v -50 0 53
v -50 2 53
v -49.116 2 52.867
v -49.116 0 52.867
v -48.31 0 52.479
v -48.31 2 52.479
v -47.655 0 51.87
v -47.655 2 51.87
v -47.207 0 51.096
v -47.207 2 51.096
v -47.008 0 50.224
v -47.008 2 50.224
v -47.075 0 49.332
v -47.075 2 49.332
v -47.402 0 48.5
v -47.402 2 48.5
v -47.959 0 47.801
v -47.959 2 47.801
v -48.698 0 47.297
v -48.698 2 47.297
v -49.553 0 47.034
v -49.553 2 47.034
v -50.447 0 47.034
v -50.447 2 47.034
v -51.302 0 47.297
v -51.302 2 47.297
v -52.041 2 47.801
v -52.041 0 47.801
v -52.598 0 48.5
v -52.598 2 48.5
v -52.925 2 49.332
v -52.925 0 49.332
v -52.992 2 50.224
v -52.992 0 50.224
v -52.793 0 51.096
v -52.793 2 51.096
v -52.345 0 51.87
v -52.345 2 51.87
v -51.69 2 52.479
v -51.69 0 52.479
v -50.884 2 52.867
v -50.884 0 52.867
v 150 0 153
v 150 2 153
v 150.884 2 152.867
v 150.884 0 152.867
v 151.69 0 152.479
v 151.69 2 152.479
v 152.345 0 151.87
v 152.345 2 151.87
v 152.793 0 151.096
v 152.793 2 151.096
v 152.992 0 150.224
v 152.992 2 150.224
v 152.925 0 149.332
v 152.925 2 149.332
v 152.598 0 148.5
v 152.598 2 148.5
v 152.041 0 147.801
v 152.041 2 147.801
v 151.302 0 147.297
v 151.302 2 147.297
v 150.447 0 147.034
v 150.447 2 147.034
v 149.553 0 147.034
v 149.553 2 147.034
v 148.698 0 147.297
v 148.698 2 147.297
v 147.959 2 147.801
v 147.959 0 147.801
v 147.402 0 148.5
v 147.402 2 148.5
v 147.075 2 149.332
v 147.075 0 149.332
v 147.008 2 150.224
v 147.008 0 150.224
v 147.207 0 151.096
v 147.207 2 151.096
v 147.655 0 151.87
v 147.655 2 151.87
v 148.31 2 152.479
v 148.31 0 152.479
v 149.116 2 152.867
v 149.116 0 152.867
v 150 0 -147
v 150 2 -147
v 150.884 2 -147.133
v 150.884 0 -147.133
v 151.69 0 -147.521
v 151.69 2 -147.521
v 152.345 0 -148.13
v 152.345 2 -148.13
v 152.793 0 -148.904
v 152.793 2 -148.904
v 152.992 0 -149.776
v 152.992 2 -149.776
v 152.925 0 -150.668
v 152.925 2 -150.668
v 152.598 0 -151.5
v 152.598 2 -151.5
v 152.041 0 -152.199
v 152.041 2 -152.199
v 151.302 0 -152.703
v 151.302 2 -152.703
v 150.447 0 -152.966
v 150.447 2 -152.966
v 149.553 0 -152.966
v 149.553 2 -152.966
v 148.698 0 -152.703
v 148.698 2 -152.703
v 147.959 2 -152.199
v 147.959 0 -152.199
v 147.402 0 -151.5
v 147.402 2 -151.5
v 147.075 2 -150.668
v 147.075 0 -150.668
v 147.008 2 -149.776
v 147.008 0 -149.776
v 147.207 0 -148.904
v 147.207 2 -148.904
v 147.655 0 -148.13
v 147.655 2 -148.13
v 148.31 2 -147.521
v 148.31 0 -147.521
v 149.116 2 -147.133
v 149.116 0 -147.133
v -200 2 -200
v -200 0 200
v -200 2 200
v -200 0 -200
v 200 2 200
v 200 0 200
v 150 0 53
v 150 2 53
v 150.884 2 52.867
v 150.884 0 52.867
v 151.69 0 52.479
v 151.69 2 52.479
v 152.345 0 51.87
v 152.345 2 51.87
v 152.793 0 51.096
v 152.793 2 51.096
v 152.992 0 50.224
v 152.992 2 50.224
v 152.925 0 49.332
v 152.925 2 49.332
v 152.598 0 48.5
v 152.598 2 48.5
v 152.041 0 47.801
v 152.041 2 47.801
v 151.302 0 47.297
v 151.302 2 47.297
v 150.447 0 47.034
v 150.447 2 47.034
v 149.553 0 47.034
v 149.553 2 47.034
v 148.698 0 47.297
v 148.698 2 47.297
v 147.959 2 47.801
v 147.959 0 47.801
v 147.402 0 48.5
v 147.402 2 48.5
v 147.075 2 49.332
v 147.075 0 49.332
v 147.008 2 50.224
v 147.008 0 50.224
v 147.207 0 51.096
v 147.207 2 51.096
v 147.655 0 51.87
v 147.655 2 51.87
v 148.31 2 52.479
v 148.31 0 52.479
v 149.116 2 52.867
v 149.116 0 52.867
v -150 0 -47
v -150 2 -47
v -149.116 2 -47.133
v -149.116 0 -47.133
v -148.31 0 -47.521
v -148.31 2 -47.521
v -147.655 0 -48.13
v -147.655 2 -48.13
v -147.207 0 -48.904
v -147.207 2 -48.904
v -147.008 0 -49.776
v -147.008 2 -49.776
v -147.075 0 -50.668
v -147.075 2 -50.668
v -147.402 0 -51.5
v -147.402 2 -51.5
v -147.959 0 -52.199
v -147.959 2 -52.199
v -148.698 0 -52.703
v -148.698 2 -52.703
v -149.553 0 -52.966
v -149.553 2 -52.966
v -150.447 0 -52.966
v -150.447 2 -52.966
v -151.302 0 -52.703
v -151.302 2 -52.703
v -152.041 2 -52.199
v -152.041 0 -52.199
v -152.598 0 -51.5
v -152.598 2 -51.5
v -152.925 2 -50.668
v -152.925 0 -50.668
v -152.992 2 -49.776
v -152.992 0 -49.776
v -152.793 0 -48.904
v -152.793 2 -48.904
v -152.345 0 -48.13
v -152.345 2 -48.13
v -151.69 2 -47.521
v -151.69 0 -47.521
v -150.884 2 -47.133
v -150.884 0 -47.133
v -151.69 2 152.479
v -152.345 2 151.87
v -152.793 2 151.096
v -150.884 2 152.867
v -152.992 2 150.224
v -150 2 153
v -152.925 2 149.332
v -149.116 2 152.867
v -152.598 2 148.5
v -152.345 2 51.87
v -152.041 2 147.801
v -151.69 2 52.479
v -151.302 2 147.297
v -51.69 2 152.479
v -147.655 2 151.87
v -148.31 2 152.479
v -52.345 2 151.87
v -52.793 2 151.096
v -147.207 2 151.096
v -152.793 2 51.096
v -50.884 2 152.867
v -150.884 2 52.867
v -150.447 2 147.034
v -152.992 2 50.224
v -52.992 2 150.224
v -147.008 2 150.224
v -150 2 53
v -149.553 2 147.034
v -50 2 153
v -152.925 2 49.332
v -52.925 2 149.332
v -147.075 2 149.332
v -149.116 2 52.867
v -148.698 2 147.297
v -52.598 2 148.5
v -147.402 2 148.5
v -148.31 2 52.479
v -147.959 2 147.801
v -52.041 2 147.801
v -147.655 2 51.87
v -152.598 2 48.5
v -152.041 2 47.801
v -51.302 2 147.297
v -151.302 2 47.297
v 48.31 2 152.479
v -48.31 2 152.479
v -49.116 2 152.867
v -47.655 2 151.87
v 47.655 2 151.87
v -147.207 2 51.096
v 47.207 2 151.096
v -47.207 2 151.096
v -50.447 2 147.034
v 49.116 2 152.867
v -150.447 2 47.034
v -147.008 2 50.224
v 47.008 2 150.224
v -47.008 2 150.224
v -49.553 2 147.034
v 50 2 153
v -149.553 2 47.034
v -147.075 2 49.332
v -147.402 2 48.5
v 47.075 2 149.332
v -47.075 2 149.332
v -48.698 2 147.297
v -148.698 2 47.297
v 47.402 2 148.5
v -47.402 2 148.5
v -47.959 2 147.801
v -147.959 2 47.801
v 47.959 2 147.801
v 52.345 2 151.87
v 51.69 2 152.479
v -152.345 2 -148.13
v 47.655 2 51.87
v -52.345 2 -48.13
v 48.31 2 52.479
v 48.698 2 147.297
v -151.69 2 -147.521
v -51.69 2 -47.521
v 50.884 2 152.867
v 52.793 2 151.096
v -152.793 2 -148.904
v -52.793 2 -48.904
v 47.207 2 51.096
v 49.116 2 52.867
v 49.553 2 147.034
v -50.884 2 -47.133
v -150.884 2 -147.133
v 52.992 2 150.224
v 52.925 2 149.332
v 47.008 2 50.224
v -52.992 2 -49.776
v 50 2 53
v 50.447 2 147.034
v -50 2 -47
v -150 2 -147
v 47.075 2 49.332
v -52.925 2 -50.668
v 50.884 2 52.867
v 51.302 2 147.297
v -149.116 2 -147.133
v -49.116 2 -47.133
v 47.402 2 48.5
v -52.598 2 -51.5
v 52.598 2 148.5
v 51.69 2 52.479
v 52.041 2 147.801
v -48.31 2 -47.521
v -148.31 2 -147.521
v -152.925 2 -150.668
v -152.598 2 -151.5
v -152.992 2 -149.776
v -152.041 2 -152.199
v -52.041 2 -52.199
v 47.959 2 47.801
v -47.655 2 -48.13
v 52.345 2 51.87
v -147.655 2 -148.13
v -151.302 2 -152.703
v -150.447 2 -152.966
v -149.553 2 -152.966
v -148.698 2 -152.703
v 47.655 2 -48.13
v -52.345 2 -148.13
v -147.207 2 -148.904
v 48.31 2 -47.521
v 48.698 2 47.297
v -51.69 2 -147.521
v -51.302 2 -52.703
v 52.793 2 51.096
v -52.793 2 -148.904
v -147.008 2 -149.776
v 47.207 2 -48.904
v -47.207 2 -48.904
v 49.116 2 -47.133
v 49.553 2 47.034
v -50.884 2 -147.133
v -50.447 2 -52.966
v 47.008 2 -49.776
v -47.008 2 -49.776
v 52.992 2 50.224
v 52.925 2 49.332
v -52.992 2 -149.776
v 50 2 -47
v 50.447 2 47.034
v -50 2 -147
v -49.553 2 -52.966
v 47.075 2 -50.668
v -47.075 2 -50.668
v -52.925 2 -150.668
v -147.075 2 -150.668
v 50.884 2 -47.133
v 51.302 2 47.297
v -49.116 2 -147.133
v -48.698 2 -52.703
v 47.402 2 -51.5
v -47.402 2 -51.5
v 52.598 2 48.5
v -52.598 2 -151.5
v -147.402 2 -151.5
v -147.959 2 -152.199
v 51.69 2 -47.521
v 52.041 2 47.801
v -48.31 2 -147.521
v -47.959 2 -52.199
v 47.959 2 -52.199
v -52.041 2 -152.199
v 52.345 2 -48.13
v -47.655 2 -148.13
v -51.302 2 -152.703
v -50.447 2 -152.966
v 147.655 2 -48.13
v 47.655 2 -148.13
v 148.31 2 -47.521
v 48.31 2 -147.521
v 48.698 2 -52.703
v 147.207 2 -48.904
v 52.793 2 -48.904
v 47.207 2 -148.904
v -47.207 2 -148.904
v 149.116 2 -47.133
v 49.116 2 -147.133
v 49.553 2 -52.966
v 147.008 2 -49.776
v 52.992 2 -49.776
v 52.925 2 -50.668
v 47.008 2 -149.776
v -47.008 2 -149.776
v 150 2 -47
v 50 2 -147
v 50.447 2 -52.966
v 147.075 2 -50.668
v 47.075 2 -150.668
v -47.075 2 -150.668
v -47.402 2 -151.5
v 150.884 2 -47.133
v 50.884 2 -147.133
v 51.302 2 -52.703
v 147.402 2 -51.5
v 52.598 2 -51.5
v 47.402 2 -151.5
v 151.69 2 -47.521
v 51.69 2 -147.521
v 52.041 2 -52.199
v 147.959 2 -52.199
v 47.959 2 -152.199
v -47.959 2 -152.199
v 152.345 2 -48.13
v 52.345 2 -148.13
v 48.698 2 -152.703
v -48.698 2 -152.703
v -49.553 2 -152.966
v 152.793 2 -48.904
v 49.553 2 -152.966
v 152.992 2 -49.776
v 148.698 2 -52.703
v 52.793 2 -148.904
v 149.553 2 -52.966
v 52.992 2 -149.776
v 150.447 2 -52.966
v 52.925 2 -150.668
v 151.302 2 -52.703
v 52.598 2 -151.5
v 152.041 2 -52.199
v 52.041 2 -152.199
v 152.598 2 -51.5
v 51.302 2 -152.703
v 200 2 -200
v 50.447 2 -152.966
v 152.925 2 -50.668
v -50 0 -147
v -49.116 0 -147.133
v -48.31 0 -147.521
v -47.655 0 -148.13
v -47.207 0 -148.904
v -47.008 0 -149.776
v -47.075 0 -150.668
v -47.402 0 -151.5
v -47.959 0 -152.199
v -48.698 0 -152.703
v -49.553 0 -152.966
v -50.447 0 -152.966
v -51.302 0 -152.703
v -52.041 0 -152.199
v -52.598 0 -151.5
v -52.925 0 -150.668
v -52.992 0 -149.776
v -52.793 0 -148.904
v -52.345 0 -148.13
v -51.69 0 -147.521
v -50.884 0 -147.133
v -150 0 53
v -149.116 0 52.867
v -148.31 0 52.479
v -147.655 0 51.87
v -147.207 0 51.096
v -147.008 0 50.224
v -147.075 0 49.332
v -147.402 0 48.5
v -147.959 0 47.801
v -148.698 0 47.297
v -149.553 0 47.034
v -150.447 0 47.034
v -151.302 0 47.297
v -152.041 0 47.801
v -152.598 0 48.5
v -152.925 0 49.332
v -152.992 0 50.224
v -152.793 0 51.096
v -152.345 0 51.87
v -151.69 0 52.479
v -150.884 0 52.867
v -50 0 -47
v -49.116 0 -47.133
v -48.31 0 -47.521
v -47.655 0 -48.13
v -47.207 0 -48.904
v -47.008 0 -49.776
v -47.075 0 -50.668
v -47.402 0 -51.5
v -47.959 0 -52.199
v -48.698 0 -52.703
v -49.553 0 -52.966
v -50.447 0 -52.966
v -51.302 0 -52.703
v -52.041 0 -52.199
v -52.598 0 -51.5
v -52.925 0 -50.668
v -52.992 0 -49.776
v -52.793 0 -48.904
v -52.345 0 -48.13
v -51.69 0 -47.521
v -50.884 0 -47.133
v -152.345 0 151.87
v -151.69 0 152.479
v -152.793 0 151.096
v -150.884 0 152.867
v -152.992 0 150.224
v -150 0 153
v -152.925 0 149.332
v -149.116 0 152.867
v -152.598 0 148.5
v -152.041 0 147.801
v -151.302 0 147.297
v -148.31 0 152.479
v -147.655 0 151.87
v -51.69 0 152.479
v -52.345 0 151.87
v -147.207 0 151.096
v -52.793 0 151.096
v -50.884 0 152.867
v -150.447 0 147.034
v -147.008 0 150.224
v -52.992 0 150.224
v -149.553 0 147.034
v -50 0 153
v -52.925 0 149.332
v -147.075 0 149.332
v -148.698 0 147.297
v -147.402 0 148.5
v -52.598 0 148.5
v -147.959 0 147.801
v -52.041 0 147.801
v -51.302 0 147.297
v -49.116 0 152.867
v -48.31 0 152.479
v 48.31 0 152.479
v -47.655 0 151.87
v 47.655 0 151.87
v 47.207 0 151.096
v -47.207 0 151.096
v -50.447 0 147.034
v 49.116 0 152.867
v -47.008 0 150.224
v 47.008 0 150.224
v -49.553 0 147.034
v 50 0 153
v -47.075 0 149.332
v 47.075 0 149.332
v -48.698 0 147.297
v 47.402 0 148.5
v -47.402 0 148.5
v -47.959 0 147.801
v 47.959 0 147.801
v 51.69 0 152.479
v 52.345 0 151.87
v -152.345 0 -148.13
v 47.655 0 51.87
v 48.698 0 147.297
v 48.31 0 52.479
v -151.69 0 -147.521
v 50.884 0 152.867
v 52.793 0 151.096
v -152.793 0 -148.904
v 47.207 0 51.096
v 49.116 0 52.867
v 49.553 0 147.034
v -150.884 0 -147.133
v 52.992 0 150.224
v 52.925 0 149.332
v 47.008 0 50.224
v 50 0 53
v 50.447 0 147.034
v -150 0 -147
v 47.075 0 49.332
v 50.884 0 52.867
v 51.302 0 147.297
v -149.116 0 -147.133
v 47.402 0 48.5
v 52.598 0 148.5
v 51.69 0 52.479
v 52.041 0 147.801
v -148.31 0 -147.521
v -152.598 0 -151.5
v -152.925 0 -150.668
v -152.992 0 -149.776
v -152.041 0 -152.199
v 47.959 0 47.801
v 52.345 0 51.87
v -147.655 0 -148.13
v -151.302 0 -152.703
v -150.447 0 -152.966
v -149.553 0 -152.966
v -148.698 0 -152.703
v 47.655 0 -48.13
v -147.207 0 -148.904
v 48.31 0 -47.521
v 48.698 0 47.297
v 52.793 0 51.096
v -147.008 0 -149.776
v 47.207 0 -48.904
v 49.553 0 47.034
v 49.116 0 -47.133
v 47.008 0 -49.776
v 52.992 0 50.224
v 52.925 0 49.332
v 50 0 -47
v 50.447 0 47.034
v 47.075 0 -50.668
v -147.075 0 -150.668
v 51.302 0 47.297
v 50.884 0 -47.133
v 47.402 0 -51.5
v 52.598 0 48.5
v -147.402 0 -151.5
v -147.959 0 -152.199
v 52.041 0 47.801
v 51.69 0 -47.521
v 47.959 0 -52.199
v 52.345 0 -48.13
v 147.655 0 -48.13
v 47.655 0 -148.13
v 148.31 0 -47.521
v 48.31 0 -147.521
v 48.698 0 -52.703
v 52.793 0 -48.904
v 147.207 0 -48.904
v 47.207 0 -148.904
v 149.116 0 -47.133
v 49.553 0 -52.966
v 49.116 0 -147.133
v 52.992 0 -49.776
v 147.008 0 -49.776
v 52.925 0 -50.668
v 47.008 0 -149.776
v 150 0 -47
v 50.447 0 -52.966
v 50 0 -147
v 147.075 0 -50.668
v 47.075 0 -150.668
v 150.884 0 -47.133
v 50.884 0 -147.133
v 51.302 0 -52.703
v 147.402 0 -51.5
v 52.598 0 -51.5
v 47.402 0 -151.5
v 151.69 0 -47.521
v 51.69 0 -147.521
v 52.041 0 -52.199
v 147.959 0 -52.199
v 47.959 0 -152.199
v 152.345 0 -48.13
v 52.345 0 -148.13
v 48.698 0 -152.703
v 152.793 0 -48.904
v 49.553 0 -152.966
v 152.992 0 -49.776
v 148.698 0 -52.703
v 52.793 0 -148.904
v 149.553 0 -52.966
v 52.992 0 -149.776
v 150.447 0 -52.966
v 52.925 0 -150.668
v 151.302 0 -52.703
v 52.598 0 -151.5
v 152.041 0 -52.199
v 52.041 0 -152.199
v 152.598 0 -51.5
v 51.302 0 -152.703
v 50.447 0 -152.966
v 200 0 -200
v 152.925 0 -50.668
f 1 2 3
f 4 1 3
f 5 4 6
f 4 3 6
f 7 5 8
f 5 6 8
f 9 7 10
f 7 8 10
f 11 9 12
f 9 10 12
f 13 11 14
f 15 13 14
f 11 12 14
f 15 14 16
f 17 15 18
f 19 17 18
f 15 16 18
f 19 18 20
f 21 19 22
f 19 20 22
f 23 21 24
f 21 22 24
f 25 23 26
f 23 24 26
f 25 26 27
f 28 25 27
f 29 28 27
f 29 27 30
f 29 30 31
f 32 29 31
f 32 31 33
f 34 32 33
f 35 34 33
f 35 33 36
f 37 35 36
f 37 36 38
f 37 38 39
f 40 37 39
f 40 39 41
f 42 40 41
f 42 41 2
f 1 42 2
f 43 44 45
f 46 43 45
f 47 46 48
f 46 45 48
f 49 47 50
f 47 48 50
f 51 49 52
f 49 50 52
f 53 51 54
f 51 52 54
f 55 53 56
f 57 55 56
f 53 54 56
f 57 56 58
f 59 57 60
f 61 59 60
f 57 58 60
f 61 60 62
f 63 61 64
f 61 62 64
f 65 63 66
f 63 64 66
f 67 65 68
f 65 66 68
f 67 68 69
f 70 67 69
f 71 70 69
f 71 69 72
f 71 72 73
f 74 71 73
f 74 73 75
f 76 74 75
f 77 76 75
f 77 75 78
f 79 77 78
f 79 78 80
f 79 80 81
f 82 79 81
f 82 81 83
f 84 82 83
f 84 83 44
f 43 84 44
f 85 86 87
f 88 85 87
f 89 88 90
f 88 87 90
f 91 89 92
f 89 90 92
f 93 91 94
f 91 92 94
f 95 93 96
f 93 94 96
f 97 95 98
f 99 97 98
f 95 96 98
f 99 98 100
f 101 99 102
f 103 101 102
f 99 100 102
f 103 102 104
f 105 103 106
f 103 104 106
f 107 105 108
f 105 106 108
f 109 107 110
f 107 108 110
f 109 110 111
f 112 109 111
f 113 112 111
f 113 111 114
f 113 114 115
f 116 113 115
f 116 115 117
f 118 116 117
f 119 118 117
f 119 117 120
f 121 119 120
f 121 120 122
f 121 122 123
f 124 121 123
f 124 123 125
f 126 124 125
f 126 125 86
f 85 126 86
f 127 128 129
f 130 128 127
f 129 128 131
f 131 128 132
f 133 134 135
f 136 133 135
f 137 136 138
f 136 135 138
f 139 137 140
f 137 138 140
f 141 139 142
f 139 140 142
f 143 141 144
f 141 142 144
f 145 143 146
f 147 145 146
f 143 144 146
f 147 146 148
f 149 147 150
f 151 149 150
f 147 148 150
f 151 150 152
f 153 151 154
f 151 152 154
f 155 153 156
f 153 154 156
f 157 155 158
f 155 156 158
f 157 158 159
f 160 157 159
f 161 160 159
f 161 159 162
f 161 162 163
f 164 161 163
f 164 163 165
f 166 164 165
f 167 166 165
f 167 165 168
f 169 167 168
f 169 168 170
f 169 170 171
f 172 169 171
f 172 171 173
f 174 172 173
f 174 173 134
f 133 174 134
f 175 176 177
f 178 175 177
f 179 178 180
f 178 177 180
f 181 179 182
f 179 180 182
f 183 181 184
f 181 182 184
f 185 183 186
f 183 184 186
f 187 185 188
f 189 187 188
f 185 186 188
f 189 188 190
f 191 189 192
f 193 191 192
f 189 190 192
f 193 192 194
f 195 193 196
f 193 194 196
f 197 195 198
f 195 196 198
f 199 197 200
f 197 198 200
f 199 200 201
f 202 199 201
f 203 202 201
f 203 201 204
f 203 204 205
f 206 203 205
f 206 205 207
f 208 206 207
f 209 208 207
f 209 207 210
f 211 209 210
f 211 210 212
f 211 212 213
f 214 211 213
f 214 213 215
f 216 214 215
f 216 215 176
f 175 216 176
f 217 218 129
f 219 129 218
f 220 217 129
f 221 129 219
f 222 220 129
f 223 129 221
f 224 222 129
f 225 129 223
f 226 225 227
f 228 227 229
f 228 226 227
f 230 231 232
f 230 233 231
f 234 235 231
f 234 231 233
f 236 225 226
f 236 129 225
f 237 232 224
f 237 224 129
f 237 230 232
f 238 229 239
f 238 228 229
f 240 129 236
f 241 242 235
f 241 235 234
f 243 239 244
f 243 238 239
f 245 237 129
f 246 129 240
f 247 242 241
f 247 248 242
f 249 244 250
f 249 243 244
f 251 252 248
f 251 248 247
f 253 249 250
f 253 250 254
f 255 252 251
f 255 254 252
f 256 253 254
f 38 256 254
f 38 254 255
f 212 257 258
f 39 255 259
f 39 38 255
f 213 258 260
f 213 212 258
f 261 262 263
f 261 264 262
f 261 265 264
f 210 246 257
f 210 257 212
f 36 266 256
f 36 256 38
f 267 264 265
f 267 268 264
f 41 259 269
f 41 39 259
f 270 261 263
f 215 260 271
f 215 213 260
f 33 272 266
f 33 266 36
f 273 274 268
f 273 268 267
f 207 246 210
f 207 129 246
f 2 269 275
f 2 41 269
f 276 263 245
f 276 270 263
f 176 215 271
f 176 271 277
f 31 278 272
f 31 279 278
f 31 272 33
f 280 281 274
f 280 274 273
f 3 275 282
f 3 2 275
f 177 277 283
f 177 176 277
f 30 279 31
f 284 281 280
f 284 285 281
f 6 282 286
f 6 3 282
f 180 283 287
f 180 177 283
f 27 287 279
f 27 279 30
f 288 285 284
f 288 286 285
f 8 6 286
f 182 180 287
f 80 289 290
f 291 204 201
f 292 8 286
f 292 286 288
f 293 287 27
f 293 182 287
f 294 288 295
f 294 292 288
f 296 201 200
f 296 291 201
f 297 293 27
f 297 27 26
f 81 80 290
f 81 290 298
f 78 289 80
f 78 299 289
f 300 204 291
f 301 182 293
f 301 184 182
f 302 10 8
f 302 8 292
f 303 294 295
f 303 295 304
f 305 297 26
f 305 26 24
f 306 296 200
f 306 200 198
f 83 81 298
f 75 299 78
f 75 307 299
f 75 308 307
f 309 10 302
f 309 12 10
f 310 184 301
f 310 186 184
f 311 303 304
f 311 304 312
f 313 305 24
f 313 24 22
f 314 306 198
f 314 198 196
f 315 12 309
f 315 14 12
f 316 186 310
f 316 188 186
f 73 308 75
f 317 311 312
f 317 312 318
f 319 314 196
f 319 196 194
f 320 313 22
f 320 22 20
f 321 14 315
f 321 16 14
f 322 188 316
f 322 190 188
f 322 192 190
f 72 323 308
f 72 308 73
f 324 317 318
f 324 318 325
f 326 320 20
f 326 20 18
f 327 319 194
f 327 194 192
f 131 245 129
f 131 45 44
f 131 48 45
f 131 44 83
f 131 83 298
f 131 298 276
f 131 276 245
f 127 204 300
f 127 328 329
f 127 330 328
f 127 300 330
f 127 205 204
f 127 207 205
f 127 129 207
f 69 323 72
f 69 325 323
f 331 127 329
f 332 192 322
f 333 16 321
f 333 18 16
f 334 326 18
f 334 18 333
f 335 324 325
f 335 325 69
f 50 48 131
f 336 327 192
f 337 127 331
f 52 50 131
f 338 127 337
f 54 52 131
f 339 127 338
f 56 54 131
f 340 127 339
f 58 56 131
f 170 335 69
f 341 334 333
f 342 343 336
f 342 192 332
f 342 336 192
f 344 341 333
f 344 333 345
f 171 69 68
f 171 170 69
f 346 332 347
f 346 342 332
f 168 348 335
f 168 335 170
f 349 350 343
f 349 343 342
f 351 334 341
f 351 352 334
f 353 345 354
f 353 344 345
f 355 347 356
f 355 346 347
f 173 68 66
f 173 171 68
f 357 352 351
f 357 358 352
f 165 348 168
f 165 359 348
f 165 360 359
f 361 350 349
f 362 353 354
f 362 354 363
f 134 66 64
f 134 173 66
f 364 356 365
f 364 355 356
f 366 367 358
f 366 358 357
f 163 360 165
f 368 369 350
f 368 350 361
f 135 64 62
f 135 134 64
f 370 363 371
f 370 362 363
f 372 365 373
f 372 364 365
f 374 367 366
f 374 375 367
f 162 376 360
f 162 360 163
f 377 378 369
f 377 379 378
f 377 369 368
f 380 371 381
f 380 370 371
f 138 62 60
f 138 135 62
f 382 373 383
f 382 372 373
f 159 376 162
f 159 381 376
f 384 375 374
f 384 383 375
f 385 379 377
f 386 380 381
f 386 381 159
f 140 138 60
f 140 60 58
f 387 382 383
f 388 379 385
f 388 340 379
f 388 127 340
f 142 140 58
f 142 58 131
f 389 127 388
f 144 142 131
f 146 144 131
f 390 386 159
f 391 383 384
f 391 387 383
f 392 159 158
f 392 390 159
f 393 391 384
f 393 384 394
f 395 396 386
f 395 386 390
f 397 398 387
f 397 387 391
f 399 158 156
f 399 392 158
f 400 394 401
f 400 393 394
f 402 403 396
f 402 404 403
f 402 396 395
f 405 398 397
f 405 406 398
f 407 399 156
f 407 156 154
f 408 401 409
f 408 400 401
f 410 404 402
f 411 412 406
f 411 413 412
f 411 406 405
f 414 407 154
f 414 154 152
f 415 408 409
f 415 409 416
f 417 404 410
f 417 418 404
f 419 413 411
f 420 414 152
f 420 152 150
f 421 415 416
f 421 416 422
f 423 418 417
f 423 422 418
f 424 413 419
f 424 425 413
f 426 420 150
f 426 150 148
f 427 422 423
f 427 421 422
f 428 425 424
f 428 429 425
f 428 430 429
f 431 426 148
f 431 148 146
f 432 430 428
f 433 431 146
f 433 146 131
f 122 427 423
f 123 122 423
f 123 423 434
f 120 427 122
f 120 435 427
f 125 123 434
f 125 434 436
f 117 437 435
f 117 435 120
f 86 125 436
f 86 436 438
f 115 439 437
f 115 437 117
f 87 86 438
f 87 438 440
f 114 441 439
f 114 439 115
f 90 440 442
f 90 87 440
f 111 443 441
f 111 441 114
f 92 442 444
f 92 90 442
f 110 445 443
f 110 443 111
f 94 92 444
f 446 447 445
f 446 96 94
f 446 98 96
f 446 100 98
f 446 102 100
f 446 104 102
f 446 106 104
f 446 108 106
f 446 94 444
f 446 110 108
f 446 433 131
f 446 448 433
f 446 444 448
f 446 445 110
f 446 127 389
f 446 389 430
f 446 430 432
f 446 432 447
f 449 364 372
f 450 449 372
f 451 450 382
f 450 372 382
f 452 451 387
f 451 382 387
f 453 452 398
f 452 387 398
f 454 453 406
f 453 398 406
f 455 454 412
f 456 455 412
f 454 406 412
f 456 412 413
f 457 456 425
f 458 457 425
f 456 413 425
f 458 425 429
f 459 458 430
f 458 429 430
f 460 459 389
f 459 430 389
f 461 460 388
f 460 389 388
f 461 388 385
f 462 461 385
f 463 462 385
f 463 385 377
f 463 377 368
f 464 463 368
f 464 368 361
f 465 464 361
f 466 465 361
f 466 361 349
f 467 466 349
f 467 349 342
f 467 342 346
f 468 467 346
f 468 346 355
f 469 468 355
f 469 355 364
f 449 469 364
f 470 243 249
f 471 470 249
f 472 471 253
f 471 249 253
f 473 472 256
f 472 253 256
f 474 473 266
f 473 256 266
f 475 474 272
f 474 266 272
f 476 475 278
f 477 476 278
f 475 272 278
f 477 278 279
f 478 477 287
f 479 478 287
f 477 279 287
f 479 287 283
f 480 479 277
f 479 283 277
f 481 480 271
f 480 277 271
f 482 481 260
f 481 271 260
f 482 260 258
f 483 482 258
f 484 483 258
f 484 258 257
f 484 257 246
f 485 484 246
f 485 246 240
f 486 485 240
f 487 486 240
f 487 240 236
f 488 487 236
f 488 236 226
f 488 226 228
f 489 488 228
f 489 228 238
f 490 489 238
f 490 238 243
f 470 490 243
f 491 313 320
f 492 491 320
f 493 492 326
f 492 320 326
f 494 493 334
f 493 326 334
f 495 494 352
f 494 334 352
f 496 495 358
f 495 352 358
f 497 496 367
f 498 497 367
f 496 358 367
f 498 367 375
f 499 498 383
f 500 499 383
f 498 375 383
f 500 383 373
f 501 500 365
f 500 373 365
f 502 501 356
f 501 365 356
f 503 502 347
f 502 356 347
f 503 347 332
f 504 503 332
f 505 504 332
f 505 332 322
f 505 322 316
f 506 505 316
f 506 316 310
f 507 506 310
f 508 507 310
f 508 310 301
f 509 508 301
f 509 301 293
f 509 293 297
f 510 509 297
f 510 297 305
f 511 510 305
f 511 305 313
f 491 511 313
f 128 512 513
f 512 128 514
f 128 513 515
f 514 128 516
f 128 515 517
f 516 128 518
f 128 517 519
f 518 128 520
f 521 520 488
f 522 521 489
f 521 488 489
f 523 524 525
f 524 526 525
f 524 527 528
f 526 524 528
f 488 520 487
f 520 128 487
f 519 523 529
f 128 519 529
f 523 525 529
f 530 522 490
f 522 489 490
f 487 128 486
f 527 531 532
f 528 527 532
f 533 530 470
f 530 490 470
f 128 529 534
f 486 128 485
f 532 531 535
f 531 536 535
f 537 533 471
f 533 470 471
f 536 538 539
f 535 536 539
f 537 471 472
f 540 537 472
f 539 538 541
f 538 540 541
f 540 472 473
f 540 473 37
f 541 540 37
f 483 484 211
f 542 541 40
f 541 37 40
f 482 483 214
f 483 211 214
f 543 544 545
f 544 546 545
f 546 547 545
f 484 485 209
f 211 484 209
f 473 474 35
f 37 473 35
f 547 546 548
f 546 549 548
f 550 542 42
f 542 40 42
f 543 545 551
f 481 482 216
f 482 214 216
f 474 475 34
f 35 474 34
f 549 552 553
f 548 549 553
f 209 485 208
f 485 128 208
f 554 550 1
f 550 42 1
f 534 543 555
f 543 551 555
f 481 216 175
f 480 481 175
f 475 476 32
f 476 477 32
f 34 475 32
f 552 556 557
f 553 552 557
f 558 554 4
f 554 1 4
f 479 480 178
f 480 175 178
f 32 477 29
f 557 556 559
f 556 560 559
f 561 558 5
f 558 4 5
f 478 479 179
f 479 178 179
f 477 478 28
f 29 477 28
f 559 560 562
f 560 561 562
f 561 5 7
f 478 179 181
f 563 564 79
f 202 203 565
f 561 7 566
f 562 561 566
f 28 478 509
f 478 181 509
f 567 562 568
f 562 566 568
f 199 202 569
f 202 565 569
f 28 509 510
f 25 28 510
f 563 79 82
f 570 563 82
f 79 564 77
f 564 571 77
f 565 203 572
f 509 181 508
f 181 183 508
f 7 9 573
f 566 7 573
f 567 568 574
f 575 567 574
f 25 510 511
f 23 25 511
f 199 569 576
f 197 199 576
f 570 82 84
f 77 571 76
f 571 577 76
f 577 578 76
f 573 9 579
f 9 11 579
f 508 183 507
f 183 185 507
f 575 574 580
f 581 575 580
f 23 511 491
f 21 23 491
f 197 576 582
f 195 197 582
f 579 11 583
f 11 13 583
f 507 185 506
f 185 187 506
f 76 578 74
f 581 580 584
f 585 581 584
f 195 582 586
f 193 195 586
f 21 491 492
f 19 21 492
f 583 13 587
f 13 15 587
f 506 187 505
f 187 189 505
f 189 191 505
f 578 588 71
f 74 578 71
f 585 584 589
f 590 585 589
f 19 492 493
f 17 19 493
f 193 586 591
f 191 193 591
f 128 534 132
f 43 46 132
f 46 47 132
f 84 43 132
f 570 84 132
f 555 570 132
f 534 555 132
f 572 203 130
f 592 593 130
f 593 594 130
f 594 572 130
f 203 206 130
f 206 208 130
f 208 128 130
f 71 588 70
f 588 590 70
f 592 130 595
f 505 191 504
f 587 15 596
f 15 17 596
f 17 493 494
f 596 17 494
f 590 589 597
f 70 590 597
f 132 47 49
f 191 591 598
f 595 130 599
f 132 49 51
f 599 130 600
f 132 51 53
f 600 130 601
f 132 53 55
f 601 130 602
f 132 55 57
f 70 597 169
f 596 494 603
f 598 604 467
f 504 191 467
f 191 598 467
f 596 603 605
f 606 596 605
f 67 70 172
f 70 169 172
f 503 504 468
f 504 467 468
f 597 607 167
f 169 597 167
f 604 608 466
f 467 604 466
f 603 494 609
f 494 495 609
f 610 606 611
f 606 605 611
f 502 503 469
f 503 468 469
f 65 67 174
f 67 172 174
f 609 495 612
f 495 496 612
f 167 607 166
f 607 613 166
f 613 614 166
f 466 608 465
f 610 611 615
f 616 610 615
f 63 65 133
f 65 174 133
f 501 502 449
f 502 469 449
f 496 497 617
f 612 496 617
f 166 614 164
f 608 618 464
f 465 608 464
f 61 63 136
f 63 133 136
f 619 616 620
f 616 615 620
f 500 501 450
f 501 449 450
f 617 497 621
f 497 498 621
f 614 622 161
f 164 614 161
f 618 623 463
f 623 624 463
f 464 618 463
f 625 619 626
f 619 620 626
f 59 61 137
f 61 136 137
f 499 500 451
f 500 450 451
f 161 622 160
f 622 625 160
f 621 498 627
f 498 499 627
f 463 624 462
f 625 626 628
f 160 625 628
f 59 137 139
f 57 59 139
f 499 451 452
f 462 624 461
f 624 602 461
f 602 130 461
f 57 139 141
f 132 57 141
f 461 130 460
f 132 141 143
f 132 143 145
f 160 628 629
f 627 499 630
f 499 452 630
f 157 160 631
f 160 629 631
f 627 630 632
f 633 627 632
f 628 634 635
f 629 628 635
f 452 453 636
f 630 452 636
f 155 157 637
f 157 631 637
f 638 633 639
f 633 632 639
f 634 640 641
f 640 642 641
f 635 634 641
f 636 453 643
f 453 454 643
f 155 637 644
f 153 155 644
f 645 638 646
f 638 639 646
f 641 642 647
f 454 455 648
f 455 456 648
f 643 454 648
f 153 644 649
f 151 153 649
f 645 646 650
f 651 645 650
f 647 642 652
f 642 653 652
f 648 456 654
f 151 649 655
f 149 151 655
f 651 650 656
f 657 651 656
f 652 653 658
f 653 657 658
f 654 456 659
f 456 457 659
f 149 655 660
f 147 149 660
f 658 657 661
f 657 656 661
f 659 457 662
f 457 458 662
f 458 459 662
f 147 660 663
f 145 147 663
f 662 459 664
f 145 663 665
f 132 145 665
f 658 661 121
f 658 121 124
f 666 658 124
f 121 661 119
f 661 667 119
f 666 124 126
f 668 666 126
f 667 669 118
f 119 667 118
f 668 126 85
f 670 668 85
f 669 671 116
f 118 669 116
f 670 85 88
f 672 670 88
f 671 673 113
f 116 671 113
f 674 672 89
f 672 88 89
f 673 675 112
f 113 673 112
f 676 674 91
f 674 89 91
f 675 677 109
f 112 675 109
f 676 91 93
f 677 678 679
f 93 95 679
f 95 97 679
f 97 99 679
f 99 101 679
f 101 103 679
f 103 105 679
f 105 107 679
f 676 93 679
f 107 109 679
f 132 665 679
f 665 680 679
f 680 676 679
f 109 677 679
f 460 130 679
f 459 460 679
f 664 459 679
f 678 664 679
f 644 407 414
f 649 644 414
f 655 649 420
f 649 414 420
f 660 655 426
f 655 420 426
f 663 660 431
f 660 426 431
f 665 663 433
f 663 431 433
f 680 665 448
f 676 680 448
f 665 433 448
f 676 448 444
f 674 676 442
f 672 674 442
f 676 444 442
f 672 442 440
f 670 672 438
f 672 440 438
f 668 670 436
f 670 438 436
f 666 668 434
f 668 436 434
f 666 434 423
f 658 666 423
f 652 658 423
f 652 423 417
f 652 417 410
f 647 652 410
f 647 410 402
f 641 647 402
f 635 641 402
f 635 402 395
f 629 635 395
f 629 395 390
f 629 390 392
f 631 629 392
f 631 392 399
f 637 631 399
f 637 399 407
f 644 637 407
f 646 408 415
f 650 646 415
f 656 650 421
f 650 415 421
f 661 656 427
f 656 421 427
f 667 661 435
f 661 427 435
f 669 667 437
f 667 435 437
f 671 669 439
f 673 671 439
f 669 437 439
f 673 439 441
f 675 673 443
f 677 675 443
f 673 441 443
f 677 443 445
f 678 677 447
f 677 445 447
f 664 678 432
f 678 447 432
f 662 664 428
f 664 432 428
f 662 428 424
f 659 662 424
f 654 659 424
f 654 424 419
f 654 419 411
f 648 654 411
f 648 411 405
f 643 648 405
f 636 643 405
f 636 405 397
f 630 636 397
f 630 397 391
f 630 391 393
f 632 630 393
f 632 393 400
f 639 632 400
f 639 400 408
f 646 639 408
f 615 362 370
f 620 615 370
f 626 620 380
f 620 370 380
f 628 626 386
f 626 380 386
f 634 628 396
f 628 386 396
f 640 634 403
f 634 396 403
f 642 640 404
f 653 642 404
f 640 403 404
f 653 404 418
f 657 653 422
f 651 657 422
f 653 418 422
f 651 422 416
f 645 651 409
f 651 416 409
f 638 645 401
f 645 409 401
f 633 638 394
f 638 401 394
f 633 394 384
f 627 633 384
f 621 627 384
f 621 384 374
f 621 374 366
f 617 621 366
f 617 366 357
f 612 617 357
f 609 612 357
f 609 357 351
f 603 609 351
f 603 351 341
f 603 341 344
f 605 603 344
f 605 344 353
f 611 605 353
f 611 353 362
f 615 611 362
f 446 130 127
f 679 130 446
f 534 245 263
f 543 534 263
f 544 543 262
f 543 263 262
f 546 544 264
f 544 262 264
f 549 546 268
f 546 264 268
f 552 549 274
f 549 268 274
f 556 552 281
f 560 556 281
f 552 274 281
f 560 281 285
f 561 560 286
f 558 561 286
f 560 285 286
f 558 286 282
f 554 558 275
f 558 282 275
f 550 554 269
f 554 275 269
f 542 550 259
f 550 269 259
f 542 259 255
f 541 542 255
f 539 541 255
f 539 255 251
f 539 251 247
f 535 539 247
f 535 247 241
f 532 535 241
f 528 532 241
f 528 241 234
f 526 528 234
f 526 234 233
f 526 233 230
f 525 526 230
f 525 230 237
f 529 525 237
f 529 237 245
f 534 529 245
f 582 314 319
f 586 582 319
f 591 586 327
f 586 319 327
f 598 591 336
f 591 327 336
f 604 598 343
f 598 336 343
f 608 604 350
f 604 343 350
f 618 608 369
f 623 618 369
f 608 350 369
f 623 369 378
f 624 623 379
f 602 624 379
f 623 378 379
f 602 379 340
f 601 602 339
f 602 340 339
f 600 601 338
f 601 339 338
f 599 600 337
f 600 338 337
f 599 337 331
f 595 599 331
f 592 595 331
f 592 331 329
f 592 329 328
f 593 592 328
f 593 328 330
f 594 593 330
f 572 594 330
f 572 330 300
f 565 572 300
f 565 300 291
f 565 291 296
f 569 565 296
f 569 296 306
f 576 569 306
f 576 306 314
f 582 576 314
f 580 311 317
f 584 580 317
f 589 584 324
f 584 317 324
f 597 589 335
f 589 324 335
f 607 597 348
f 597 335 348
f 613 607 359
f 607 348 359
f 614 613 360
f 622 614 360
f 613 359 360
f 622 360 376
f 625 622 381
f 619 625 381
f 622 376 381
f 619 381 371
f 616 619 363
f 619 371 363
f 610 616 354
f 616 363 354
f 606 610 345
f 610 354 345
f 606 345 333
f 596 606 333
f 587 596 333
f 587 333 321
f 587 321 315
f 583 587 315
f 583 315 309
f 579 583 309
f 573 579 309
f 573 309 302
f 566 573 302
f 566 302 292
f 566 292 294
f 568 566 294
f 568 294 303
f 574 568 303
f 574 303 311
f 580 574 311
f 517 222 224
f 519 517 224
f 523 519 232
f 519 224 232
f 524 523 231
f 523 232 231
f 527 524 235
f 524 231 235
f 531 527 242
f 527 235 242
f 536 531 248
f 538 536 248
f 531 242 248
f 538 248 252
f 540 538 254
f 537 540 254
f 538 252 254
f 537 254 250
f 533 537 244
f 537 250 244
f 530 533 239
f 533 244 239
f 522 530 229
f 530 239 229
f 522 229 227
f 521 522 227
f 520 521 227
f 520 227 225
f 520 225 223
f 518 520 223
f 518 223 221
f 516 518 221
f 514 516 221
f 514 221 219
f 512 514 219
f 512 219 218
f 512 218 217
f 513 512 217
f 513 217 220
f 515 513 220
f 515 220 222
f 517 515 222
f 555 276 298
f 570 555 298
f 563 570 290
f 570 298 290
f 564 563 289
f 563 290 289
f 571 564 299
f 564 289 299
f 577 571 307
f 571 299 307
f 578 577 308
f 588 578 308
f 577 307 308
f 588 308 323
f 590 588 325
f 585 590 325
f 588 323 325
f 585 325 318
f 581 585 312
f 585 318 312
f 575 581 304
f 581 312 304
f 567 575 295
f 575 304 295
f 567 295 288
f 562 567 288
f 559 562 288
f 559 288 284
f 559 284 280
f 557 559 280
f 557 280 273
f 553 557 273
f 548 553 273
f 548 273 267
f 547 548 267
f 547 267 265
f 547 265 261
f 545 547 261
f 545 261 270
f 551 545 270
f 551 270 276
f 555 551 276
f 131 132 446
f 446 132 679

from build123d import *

# Parameters (mm, degrees)
SKETCH1_W           = 400
SKETCH1_H           = 400
BOSS_EXTRUDE1_DEPTH = 2
SKETCH2_R           = 3
CUT_EXTRUDE1_DEPTH  = 283.849783454


with BuildPart() as part:
    # Sketch1 → Boss-Extrude1 (new body)
    with BuildSketch(Plane(origin=(0, 0, 0), x_dir=(1, 0, 0), z_dir=(0, 1, 0))):
        Rectangle(SKETCH1_W, SKETCH1_H)
    extrude(amount=BOSS_EXTRUDE1_DEPTH)

    # Sketch2 → Cut-Extrude1 (cut, through all)
    with BuildSketch(Plane(origin=(0, 2, 0), x_dir=(1, 0, 0), z_dir=(0, 1, 0))):
        with Locations(Location((-150, 150, 0), (0, 0, 270))):
            Circle(SKETCH2_R)
        with Locations(Location((-50, 150, 0), (0, 0, 270))):
            Circle(SKETCH2_R)
        with Locations(Location((50, 150, 0), (0, 0, 270))):
            Circle(SKETCH2_R)
        with Locations(Location((150, 150, 0), (0, 0, 270))):
            Circle(SKETCH2_R)
        with Locations(Location((-50, 50, 0), (0, 0, 270))):
            Circle(SKETCH2_R)
        with Locations(Location((50, 50, 0), (0, 0, 270))):
            Circle(SKETCH2_R)
        with Locations(Location((150, 50, 0), (0, 0, 270))):
            Circle(SKETCH2_R)
        with Locations(Location((-50, -50, 0), (0, 0, 270))):
            Circle(SKETCH2_R)
        with Locations(Location((50, -50, 0), (0, 0, 270))):
            Circle(SKETCH2_R)
        with Locations(Location((150, -50, 0), (0, 0, 270))):
            Circle(SKETCH2_R)
        with Locations(Location((-50, -150, 0), (0, 0, 270))):
            Circle(SKETCH2_R)
        with Locations(Location((50, -150, 0), (0, 0, 270))):
            Circle(SKETCH2_R)
        with Locations(Location((150, -150, 0), (0, 0, 270))):
            Circle(SKETCH2_R)
        with Locations(Location((-150, 50, 0), (0, 0, 270))):
            Circle(SKETCH2_R)
        with Locations(Location((-150, -50, 0), (0, 0, 270))):
            Circle(SKETCH2_R)
        with Locations(Location((-150, -150, 0), (0, 0, 270))):
            Circle(SKETCH2_R)
    extrude(amount=-CUT_EXTRUDE1_DEPTH, mode=Mode.SUBTRACT)


solid = part.part
